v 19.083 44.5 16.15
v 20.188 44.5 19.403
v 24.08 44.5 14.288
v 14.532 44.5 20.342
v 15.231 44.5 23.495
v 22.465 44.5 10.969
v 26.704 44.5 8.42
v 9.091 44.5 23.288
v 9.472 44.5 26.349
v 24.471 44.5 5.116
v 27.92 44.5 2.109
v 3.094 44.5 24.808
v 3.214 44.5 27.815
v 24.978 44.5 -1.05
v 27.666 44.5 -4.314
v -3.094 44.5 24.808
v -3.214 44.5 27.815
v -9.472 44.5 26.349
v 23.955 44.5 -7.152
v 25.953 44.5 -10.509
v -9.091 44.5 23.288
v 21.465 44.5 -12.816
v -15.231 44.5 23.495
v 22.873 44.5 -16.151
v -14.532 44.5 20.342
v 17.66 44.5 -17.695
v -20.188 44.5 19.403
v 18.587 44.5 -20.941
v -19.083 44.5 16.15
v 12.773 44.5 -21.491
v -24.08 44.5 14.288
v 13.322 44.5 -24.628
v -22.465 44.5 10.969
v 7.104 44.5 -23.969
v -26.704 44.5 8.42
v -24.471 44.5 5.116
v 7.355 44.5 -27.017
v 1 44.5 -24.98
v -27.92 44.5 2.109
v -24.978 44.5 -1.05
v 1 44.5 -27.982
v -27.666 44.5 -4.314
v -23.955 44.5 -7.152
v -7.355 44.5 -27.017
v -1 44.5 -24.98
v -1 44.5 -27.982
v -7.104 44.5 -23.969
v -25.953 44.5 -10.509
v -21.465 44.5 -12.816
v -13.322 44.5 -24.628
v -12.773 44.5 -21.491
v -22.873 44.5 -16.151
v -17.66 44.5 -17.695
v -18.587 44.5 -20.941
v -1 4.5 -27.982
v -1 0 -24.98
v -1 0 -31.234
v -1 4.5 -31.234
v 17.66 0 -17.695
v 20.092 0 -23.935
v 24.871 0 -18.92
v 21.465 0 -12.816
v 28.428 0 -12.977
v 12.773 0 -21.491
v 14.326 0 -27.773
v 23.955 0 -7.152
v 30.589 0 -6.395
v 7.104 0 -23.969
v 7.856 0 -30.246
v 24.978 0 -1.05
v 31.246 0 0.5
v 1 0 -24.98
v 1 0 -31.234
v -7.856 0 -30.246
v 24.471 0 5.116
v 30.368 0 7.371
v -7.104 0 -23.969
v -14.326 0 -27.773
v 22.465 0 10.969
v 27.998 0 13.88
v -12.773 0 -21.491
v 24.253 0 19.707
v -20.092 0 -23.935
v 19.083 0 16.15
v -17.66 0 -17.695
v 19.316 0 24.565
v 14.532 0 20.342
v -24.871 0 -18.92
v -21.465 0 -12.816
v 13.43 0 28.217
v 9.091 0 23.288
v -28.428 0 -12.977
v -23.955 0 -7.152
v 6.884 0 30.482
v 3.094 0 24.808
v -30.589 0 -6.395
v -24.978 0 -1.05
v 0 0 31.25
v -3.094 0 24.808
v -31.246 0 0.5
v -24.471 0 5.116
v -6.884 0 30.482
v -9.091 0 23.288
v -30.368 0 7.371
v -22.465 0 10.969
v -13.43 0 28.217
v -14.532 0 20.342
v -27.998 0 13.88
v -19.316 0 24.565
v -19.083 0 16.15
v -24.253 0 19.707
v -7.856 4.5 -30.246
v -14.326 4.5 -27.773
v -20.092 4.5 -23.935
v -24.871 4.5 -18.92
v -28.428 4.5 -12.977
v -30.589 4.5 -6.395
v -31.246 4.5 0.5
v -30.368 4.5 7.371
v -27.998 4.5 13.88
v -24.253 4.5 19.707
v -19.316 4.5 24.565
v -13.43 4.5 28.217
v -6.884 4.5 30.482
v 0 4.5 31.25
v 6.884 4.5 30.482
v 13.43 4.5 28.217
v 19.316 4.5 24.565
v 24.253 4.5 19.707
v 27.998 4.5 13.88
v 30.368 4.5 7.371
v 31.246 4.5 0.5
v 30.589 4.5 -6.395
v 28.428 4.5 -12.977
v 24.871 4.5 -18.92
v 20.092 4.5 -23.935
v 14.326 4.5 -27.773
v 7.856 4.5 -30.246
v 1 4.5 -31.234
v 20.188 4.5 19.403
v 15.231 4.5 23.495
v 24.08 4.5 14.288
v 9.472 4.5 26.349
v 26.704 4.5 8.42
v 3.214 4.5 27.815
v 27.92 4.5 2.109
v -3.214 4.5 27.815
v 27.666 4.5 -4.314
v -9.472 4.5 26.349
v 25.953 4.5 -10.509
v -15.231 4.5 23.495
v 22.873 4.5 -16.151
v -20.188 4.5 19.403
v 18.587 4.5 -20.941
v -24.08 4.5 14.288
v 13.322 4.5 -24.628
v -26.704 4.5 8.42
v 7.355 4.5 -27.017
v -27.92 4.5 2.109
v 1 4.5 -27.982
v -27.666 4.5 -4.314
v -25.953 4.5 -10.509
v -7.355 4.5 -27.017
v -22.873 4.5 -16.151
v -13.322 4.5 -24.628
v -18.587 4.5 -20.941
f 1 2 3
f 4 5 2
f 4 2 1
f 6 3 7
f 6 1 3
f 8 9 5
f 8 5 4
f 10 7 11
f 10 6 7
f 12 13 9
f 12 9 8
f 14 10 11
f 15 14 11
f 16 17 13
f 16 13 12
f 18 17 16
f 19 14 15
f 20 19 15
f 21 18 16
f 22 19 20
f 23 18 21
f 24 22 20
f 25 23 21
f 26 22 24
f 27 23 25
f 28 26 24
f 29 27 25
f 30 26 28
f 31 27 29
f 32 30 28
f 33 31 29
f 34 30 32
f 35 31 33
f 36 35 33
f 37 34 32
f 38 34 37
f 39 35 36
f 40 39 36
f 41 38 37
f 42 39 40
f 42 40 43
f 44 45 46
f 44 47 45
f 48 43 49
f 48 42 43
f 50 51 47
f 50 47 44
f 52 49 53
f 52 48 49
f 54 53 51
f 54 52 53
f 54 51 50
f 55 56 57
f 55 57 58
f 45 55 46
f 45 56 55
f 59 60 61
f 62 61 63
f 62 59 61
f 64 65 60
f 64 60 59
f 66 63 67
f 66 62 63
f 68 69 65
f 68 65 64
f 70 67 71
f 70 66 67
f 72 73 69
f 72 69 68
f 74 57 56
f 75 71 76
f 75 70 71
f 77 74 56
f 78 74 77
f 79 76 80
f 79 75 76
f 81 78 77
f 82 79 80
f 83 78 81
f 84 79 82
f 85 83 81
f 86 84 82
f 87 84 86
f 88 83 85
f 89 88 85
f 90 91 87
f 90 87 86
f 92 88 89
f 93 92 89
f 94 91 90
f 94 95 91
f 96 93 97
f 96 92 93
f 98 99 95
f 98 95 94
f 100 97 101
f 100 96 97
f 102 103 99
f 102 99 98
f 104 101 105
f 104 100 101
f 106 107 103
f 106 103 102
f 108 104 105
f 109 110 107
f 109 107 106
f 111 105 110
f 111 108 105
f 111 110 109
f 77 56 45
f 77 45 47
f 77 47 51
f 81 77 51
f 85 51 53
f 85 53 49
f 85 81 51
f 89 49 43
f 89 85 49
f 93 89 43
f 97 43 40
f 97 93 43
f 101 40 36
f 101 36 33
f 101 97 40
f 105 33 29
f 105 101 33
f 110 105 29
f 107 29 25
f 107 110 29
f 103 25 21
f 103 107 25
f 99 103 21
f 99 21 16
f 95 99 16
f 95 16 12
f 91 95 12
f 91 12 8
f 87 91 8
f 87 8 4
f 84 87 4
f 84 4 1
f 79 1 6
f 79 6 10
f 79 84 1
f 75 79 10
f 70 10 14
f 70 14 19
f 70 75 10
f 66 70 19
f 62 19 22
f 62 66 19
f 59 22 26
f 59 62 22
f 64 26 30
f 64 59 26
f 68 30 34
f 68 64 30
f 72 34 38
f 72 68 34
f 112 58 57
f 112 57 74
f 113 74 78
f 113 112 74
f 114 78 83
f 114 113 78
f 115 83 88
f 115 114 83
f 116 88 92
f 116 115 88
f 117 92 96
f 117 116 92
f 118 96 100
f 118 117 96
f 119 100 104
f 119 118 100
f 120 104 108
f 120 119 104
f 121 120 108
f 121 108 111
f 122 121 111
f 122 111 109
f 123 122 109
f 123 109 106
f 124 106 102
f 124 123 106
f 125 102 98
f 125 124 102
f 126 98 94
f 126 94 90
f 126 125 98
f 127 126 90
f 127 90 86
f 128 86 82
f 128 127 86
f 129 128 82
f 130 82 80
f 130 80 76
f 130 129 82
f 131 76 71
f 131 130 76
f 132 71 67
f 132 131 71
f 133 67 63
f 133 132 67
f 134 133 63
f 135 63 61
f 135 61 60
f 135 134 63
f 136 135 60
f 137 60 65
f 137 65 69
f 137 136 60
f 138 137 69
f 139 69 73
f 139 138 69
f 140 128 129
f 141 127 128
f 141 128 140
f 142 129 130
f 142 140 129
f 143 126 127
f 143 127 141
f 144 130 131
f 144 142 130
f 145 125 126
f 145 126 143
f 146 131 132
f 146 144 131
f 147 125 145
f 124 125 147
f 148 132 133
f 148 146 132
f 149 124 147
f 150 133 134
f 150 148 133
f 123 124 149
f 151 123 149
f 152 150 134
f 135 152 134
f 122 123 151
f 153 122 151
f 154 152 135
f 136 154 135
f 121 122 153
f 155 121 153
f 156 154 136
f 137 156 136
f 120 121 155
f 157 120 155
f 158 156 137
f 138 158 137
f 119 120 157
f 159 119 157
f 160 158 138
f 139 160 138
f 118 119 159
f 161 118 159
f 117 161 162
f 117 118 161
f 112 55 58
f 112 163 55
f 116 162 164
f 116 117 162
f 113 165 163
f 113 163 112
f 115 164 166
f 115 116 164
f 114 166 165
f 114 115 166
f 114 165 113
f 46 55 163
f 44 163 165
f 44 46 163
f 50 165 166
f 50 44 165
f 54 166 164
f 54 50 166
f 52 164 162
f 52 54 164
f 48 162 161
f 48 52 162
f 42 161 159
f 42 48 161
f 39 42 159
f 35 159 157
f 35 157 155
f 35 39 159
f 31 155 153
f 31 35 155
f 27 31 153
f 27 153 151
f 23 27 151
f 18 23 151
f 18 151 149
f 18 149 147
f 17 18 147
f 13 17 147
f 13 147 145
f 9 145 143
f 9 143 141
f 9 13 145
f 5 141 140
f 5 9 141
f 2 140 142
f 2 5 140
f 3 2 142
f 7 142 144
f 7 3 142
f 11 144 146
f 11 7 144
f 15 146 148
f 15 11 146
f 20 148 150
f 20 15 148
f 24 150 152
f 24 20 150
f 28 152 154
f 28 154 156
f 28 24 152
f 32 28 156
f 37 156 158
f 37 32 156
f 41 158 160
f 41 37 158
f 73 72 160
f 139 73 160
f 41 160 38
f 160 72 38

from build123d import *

# Parameters (mm, degrees)
ESQUISSE2_W             = 2
ESQUISSE2_H             = 44.5
ENL_V_MAT_EXTRU_1_DEPTH = 32.25


with BuildPart() as part:
    # Esquisse1 → Révolution1 (revolve)
    with BuildSketch(Plane(origin=(0, 0, 0), x_dir=(0, 0, -1), z_dir=(1, 0, 0))):
        Polygon((25, 44.5), (25, 0), (31.25, 0), (31.25, 4.5), (28, 4.5), (28, 44.5), align=None)
    revolve(axis=Axis((0, 0, 0), (0, 1, 0)))

    # Esquisse2 → Enlèv. mat.-Extru.1 (cut, through all)
    with BuildSketch(Plane.XY):
        with Locations((0, 22.25)):
            Rectangle(ESQUISSE2_W, ESQUISSE2_H)
    extrude(amount=-ENL_V_MAT_EXTRU_1_DEPTH, mode=Mode.SUBTRACT)


solid = part.part
